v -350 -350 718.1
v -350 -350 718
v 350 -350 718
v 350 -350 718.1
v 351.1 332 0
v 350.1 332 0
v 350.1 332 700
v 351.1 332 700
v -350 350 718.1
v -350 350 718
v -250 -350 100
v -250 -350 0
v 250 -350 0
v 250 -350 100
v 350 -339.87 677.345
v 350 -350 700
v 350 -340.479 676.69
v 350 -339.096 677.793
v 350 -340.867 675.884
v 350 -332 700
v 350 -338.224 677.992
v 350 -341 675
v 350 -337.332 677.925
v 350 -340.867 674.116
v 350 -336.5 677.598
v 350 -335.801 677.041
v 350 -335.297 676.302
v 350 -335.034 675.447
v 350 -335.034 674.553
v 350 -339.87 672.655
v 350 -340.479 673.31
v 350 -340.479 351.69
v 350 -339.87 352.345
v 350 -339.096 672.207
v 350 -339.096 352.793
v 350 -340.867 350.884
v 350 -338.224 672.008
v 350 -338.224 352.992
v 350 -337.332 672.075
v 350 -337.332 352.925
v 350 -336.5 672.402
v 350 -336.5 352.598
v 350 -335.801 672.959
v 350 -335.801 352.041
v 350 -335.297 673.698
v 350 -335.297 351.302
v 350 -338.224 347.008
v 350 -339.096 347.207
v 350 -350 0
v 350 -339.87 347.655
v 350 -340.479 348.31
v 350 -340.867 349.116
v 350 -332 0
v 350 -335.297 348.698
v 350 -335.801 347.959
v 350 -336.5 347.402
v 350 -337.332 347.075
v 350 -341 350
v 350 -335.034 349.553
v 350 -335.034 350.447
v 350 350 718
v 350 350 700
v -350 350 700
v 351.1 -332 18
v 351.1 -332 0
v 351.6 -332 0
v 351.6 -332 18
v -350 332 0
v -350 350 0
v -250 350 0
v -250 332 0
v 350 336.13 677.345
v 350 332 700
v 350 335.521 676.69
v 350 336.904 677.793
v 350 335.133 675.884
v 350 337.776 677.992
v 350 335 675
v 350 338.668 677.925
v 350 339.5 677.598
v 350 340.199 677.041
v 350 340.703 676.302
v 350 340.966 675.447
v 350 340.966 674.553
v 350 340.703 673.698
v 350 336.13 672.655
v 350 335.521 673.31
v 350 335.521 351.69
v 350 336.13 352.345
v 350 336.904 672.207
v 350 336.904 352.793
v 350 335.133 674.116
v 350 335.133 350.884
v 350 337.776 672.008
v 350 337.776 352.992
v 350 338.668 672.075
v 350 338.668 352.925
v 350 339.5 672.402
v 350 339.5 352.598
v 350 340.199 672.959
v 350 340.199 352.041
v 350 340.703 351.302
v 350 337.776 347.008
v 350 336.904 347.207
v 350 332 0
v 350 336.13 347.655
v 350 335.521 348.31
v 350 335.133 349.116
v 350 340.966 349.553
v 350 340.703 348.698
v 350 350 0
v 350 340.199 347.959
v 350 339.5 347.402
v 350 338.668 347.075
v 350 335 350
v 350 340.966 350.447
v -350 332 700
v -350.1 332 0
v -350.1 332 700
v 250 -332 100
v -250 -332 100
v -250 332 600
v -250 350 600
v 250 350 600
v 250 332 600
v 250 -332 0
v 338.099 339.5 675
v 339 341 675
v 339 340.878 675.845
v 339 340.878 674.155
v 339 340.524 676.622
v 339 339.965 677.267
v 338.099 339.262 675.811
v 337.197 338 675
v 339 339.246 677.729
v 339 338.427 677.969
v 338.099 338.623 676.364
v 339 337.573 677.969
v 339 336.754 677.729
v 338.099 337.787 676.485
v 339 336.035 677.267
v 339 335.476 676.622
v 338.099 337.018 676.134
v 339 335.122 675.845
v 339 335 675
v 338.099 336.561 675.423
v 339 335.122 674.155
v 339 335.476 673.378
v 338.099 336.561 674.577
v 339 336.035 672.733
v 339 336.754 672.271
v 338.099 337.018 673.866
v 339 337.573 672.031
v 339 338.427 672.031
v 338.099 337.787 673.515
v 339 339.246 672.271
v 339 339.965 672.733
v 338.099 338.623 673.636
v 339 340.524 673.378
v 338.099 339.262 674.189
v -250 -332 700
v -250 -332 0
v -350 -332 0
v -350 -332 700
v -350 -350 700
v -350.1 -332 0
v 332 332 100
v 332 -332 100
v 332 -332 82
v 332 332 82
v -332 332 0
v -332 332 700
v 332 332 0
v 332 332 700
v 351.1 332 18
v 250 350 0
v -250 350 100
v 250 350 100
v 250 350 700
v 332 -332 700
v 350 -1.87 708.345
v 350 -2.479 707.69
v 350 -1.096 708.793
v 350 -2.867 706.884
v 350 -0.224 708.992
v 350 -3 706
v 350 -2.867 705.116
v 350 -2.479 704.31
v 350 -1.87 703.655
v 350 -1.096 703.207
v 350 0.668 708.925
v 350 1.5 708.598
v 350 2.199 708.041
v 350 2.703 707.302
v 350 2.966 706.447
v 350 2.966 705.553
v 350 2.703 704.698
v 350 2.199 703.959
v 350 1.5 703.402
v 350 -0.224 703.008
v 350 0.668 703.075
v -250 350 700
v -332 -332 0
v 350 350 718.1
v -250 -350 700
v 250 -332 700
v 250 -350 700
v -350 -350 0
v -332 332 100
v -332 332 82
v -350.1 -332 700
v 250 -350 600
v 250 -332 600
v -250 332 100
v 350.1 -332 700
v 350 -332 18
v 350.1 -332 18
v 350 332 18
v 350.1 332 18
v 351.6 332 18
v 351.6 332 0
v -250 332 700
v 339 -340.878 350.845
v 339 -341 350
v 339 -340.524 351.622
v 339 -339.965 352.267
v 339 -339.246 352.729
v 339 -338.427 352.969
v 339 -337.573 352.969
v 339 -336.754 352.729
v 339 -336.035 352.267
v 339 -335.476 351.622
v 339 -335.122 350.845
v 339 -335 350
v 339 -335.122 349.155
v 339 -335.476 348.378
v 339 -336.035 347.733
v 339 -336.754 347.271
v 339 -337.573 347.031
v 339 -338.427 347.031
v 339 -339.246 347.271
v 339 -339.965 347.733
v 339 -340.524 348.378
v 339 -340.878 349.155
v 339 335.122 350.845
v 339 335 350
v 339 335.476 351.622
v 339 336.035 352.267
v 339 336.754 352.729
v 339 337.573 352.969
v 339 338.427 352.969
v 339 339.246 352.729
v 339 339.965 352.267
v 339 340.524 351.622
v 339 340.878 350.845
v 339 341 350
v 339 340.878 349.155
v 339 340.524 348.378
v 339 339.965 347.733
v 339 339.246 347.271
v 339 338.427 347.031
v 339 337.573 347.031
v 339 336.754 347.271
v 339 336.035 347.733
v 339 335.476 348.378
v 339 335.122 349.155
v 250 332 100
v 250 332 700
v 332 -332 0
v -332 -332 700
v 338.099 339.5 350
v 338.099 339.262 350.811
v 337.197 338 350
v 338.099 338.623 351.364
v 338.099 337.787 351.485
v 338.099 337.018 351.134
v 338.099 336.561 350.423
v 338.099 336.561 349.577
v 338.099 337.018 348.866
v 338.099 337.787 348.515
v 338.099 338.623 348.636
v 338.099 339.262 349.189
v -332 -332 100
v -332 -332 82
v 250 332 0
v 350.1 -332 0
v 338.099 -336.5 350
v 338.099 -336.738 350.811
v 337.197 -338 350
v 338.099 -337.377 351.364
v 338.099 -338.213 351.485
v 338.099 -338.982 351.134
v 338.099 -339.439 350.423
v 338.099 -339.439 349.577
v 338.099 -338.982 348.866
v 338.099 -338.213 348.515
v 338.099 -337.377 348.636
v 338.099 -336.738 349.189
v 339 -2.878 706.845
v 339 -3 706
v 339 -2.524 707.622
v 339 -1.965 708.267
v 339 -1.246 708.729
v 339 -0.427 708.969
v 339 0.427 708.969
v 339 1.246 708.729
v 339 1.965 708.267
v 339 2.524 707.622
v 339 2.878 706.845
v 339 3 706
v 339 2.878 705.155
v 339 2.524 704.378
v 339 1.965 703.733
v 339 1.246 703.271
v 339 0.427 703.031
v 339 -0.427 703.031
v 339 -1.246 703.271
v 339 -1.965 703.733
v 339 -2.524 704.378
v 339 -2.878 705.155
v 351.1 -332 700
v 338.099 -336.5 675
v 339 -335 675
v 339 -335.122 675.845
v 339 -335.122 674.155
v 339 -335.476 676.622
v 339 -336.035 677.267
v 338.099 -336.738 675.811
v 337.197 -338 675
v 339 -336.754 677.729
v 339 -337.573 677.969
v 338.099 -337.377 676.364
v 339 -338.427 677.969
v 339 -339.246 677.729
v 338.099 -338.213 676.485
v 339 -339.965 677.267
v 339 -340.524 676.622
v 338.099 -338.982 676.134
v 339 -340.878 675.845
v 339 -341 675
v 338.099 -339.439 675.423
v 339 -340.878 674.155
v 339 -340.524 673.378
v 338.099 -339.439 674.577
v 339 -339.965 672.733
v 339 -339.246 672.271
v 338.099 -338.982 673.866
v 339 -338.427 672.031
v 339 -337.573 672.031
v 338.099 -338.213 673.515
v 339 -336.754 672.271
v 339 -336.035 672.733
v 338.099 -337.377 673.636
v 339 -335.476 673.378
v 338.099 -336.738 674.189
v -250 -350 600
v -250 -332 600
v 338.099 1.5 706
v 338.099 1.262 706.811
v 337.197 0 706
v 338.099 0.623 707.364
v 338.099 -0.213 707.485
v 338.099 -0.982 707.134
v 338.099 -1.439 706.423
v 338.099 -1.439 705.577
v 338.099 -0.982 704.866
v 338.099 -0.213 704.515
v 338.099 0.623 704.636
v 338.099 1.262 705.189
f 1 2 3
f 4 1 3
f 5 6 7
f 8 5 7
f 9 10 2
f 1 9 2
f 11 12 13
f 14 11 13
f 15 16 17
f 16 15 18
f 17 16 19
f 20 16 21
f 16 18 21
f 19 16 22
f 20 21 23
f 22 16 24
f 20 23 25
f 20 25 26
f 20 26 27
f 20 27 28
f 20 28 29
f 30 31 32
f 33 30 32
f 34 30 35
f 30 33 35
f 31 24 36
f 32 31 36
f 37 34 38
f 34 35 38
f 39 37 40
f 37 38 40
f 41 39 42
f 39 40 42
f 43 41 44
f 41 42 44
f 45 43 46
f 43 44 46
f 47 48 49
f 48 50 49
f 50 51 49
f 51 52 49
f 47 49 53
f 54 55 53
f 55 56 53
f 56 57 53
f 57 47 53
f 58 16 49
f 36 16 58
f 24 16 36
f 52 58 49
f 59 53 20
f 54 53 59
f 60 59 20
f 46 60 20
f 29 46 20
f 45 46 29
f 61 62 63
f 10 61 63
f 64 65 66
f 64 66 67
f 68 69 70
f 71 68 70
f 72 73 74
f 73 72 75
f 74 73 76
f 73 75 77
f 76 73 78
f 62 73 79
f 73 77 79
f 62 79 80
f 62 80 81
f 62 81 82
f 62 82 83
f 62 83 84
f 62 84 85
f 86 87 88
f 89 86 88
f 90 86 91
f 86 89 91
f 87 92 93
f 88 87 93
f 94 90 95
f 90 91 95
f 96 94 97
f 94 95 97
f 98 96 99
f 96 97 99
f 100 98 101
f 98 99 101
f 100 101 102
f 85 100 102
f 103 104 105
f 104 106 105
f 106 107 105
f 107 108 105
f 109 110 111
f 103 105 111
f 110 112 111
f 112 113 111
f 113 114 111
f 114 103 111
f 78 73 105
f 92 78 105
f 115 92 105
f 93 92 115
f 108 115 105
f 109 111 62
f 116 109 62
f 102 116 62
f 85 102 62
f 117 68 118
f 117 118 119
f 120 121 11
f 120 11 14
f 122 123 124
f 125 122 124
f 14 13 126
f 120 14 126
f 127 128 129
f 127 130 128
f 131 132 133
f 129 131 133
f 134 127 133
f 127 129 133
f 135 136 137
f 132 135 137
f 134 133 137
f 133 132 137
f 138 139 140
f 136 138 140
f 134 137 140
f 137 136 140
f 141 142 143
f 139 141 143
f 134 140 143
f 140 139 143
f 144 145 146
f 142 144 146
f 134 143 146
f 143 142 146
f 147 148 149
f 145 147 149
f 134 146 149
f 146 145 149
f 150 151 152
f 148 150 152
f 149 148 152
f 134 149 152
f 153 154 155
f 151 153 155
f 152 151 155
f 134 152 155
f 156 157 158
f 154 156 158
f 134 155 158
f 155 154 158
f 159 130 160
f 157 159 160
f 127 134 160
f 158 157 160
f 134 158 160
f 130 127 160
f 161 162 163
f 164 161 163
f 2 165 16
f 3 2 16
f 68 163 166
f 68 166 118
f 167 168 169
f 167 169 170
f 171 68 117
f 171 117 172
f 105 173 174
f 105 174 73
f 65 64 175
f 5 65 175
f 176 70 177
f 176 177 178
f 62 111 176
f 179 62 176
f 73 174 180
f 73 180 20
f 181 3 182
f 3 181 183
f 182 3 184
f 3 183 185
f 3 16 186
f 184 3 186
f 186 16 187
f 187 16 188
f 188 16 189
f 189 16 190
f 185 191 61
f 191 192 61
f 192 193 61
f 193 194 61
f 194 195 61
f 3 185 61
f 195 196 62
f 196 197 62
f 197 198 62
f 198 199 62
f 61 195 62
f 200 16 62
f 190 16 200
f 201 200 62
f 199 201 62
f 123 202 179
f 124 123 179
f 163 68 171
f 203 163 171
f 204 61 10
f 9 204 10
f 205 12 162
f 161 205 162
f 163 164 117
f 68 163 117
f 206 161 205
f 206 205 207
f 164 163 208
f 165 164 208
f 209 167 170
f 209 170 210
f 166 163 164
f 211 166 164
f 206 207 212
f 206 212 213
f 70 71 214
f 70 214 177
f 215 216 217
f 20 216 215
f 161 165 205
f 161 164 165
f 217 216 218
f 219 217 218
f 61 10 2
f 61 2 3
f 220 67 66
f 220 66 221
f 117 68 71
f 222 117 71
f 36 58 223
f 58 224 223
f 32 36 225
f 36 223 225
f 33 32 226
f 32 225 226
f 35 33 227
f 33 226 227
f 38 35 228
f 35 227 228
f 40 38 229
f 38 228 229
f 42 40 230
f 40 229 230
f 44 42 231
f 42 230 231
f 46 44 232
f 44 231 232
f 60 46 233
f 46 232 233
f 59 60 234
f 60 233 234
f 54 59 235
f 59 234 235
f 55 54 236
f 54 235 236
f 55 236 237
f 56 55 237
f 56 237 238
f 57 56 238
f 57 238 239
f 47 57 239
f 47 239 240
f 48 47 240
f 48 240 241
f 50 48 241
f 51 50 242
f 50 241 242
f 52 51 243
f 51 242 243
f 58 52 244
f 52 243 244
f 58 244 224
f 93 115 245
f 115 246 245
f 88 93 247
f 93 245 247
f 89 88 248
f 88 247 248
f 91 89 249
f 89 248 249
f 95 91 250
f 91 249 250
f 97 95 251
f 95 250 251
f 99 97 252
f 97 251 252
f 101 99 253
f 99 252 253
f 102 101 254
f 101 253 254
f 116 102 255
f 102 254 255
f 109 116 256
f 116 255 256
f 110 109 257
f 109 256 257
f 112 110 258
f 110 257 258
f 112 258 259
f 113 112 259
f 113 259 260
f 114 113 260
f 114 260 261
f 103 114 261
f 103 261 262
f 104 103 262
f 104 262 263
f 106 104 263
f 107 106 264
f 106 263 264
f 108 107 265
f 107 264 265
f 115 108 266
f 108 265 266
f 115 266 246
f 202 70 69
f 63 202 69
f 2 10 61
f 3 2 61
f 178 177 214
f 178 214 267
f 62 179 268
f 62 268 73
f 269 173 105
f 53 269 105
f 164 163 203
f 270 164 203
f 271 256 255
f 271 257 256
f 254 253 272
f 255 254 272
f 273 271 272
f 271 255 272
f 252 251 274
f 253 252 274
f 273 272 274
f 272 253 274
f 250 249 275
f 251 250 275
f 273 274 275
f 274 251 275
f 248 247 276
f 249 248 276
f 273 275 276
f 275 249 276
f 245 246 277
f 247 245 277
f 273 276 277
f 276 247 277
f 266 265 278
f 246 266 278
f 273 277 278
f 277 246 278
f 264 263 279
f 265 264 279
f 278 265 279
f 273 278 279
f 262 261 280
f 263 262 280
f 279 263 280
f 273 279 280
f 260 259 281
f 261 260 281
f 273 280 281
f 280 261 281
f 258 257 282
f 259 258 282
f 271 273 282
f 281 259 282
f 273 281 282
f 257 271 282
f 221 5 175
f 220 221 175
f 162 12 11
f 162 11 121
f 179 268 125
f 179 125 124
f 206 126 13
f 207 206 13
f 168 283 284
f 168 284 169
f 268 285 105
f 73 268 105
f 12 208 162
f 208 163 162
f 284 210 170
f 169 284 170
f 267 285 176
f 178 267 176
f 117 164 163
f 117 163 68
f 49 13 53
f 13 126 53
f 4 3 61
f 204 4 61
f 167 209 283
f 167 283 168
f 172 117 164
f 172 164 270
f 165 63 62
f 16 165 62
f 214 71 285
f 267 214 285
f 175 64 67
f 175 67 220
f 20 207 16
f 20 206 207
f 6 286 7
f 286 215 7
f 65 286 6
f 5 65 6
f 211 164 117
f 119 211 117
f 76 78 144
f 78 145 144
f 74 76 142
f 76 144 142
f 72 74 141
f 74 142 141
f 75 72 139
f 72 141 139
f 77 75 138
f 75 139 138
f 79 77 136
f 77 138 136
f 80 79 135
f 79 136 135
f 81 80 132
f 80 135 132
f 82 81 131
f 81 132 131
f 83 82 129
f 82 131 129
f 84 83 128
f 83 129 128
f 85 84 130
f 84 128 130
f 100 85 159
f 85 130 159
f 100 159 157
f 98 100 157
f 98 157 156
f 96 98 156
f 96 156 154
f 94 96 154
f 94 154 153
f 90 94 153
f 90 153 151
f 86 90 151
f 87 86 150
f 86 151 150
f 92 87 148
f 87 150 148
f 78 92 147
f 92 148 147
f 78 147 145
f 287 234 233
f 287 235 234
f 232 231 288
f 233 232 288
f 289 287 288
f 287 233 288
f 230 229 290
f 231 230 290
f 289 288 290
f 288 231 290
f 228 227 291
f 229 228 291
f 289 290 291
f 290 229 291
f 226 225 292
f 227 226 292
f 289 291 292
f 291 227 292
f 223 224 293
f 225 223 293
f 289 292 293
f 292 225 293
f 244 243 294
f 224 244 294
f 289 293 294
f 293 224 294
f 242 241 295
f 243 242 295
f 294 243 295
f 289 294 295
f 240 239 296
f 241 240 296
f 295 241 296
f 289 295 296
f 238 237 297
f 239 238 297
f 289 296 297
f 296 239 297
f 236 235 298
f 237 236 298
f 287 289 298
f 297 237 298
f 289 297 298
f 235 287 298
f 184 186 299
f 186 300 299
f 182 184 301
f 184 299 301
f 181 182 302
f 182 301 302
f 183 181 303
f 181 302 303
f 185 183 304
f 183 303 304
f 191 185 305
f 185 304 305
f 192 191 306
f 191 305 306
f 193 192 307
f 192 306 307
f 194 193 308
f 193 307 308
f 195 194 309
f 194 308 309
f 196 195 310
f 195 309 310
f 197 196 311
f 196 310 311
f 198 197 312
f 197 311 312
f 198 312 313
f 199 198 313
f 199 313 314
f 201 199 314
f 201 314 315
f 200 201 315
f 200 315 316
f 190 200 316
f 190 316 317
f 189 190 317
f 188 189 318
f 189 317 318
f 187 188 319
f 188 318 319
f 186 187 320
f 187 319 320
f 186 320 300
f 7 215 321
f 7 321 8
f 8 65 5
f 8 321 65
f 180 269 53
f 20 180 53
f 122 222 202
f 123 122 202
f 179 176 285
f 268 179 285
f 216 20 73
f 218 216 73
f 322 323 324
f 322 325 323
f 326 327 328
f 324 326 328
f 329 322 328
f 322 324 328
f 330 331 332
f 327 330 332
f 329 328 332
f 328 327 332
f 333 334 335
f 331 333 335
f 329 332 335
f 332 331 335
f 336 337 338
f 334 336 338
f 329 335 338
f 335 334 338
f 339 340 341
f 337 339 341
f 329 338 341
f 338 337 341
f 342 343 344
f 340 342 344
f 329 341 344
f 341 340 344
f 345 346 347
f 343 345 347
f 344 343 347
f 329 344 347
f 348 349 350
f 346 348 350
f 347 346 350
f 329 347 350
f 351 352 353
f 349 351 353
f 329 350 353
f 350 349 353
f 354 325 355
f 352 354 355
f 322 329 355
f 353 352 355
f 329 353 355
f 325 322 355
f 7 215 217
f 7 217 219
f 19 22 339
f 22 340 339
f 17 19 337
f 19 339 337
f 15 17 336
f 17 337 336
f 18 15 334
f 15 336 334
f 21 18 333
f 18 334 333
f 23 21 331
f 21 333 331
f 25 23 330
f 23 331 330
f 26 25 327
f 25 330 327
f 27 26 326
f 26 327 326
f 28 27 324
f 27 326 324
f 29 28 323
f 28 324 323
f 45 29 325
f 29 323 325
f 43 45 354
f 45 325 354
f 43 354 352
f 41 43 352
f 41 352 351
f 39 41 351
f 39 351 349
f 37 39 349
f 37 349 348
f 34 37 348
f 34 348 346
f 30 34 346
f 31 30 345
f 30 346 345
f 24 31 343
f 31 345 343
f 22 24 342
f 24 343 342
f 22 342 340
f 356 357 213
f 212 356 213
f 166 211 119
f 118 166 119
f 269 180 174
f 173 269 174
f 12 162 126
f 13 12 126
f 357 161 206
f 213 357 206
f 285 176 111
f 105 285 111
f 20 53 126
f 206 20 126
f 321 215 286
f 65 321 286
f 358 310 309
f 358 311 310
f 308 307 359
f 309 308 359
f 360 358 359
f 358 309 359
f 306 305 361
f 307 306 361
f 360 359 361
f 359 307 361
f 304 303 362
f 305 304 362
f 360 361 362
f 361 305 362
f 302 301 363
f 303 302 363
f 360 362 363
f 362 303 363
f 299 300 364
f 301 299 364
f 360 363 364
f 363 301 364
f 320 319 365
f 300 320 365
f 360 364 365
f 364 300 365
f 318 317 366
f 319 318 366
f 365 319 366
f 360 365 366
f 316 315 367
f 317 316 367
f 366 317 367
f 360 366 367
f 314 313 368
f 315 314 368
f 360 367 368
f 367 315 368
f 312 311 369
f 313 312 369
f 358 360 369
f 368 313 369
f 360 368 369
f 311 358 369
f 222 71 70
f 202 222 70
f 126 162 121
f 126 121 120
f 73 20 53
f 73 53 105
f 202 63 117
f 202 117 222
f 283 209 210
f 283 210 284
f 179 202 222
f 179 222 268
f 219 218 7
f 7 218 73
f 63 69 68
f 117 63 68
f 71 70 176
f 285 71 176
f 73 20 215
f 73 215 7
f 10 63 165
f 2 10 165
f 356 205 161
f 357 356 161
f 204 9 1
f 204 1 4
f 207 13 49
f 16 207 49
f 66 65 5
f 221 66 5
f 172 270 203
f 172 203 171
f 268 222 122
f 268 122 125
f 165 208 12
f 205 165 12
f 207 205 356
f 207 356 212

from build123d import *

# Parameters (mm, degrees)
F1_DEPTH    = 700
F0_W        = 18
F0_H        = 664
F2_DEPTH    = 700
F0_W_2      = 500
F0_H_2      = 18
F3_DEPTH    = 100
F4_W        = 500
F4_H        = 18
F5_DEPTH    = 100
F7_DEPTH    = 18
F8_W        = 18
F8_H        = 664
F9_DEPTH    = 18
F10_DEPTH   = 0.1
F11_DEPTH   = 0.1
F12_W       = 664
F12_H       = 682
F13_DEPTH   = 0.1
F14_W       = 664
F14_H       = 18
F14_H_2     = 682
F15_DEPTH   = 1
F16_W       = 664
F16_H       = 18
F17_DEPTH   = 0.5
F19_D       = 6
F19_DEPTH   = 11
F19_TIP     = 1.8025818571
F19_2_D     = 6
F19_2_DEPTH = 11
F19_2_TIP   = 1.8025818571
F19_3_D     = 6
F19_3_DEPTH = 11
F19_3_TIP   = 1.8025818571


with BuildPart() as f1:
    # F0 (on Top) → F1 (new body)
    with BuildSketch(Plane.XY):
        Polygon((-350, -350), (-250, -350), (-250, -332), (-332, -332), (-350, -332), align=None)
    extrude(amount=F1_DEPTH)


with BuildPart() as f1b:
    # F0 (on Top) → F1, piece 2 (new body)
    with BuildSketch(Plane.XY):
        Polygon((250, -350), (350, -350), (350, -332), (332, -332), (250, -332), align=None)
    extrude(amount=F1_DEPTH)

    # F19
    with Locations(Plane.YZ.offset(350)):
        with Locations((-338, 675), (0, 706), (338, 675), (338, 350), (-338, 350)):
            Hole(F19_D / 2, depth=F19_DEPTH)
            with Locations((0, 0, -(F19_DEPTH + F19_TIP / 2))):  # 118° drill point
                Cone(0, F19_D / 2, F19_TIP, mode=Mode.SUBTRACT)


with BuildPart() as f1c:
    # F0 (on Top) → F1, piece 3 (new body)
    with BuildSketch(Plane.XY):
        Polygon((332, 332), (350, 332), (350, 350), (250, 350), (250, 332), align=None)
    extrude(amount=F1_DEPTH)

    # F19#2
    with Locations(Plane.YZ.offset(350)):
        with Locations((-338, 675), (0, 706), (338, 675), (338, 350), (-338, 350)):
            Hole(F19_2_D / 2, depth=F19_2_DEPTH)
            with Locations((0, 0, -(F19_2_DEPTH + F19_2_TIP / 2))):  # 118° drill point
                Cone(0, F19_2_D / 2, F19_2_TIP, mode=Mode.SUBTRACT)


with BuildPart() as f1d:
    # F0 (on Top) → F1, piece 4 (new body)
    with BuildSketch(Plane.XY):
        Polygon((-350, 350), (-350, 332), (-332, 332), (-250, 332), (-250, 350), align=None)
    extrude(amount=F1_DEPTH)


with BuildPart() as f2:
    # F0 (on Top) → F2 (new body, through all)
    with BuildSketch(Plane.XY):
        with Locations((-341, 0)):
            Rectangle(F0_W, F0_H)
    extrude(amount=F2_DEPTH)


with BuildPart() as f2b:
    # F0 (on Top) → F2, piece 2 (new body, through all)
    with BuildSketch(Plane.XY):
        with Locations((341, 0)):
            Rectangle(F0_W, F0_H)
    extrude(amount=F2_DEPTH)


with BuildPart() as f3:
    # F0 (on Top) → F3 (new body)
    with BuildSketch(Plane.XY):
        with Locations((0, -341)):
            Rectangle(F0_W_2, F0_H_2)
    extrude(amount=F3_DEPTH)


with BuildPart() as f3b:
    # F0 (on Top) → F3, piece 2 (new body)
    with BuildSketch(Plane.XY):
        with Locations((0, 341)):
            Rectangle(F0_W_2, F0_H_2)
    extrude(amount=F3_DEPTH)


with BuildPart() as f5:
    # F4 (on face) → F5 (new body)
    with BuildSketch(Plane.XY.offset(700)):
        with Locations((0, 341)):
            Rectangle(F4_W, F4_H)
    extrude(amount=-F5_DEPTH)


with BuildPart() as f5b:
    # F4 (on face) → F5, piece 2 (new body)
    with BuildSketch(Plane.XY.offset(700)):
        with Locations((0, -341)):
            Rectangle(F4_W, F4_H)
    extrude(amount=-F5_DEPTH)


with BuildPart() as f7:
    # F6 (on face) → F7 (new body)
    with BuildSketch(Plane.XY.offset(100)):
        Polygon((332, -332), (332, 332), (250, 332), (-250, 332), (-332, 332), (-332, -332), align=None)
    extrude(amount=-F7_DEPTH)


with BuildPart() as f9:
    # F8 (on face) → F9 (new body)
    with BuildSketch(Plane.XY.offset(700)):
        Polygon((250, 350), (-250, 350), (-350, 350), (-350, 332), (-332, 332), (-332, -332), (-350, -332), (-350, -350), (-250, -350), (250, -350), (350, -350), (350, -332), (350, 332), (350, 350), align=None)
        with Locations((-341, 0)):
            Rectangle(F8_W, F8_H)
    extrude(amount=F9_DEPTH)


with BuildPart() as f10:
    # F10 (new): a face of the model
    f10_faces = [f9.part.faces().sort_by_distance(p)[0] for p in [
        (0, 0, 718),
    ]]
    extrude(f10_faces, amount=F10_DEPTH)


with BuildPart() as f11:
    # F11 (new): a face of the model
    f11_faces = [f2.part.faces().sort_by_distance(p)[0] for p in [
        (-350, 0, 350),
    ]]
    extrude(f11_faces, amount=F11_DEPTH)


with BuildPart() as f13:
    # F12 (on face) → F13 (new body)
    with BuildSketch(Plane.YZ.offset(350)):
        with Locations((0, 359)):
            Rectangle(F12_W, F12_H)
    extrude(amount=F13_DEPTH)


with BuildPart() as f15:
    # F14 (on face) → F15 (new body)
    with BuildSketch(Plane.YZ.offset(350.1)):
        with Locations((0, 9)):
            Rectangle(F14_W, F14_H)
        with Locations((0, 359)):
            Rectangle(F14_W, F14_H_2)
    extrude(amount=F15_DEPTH)


with BuildPart() as f17:
    # F16 (on face) → F17 (new body)
    with BuildSketch(Plane.YZ.offset(351.1)):
        with Locations((0, 9)):
            Rectangle(F16_W, F16_H)
    extrude(amount=F17_DEPTH)


with BuildPart() as f9_1:
    add(f9.part)

    # F19#3
    with Locations(Plane.YZ.offset(350)):
        with Locations((-338, 675), (0, 706), (338, 675), (338, 350), (-338, 350)):
            Hole(F19_3_D / 2, depth=F19_3_DEPTH)
            with Locations((0, 0, -(F19_3_DEPTH + F19_3_TIP / 2))):  # 118° drill point
                Cone(0, F19_3_D / 2, F19_3_TIP, mode=Mode.SUBTRACT)


solid = Compound([f1.part, f1b.part, f1c.part, f1d.part, f2.part, f2b.part, f3.part, f3b.part, f5.part, f5b.part, f7.part, f10.part, f11.part, f13.part, f15.part, f17.part, f9_1.part])
